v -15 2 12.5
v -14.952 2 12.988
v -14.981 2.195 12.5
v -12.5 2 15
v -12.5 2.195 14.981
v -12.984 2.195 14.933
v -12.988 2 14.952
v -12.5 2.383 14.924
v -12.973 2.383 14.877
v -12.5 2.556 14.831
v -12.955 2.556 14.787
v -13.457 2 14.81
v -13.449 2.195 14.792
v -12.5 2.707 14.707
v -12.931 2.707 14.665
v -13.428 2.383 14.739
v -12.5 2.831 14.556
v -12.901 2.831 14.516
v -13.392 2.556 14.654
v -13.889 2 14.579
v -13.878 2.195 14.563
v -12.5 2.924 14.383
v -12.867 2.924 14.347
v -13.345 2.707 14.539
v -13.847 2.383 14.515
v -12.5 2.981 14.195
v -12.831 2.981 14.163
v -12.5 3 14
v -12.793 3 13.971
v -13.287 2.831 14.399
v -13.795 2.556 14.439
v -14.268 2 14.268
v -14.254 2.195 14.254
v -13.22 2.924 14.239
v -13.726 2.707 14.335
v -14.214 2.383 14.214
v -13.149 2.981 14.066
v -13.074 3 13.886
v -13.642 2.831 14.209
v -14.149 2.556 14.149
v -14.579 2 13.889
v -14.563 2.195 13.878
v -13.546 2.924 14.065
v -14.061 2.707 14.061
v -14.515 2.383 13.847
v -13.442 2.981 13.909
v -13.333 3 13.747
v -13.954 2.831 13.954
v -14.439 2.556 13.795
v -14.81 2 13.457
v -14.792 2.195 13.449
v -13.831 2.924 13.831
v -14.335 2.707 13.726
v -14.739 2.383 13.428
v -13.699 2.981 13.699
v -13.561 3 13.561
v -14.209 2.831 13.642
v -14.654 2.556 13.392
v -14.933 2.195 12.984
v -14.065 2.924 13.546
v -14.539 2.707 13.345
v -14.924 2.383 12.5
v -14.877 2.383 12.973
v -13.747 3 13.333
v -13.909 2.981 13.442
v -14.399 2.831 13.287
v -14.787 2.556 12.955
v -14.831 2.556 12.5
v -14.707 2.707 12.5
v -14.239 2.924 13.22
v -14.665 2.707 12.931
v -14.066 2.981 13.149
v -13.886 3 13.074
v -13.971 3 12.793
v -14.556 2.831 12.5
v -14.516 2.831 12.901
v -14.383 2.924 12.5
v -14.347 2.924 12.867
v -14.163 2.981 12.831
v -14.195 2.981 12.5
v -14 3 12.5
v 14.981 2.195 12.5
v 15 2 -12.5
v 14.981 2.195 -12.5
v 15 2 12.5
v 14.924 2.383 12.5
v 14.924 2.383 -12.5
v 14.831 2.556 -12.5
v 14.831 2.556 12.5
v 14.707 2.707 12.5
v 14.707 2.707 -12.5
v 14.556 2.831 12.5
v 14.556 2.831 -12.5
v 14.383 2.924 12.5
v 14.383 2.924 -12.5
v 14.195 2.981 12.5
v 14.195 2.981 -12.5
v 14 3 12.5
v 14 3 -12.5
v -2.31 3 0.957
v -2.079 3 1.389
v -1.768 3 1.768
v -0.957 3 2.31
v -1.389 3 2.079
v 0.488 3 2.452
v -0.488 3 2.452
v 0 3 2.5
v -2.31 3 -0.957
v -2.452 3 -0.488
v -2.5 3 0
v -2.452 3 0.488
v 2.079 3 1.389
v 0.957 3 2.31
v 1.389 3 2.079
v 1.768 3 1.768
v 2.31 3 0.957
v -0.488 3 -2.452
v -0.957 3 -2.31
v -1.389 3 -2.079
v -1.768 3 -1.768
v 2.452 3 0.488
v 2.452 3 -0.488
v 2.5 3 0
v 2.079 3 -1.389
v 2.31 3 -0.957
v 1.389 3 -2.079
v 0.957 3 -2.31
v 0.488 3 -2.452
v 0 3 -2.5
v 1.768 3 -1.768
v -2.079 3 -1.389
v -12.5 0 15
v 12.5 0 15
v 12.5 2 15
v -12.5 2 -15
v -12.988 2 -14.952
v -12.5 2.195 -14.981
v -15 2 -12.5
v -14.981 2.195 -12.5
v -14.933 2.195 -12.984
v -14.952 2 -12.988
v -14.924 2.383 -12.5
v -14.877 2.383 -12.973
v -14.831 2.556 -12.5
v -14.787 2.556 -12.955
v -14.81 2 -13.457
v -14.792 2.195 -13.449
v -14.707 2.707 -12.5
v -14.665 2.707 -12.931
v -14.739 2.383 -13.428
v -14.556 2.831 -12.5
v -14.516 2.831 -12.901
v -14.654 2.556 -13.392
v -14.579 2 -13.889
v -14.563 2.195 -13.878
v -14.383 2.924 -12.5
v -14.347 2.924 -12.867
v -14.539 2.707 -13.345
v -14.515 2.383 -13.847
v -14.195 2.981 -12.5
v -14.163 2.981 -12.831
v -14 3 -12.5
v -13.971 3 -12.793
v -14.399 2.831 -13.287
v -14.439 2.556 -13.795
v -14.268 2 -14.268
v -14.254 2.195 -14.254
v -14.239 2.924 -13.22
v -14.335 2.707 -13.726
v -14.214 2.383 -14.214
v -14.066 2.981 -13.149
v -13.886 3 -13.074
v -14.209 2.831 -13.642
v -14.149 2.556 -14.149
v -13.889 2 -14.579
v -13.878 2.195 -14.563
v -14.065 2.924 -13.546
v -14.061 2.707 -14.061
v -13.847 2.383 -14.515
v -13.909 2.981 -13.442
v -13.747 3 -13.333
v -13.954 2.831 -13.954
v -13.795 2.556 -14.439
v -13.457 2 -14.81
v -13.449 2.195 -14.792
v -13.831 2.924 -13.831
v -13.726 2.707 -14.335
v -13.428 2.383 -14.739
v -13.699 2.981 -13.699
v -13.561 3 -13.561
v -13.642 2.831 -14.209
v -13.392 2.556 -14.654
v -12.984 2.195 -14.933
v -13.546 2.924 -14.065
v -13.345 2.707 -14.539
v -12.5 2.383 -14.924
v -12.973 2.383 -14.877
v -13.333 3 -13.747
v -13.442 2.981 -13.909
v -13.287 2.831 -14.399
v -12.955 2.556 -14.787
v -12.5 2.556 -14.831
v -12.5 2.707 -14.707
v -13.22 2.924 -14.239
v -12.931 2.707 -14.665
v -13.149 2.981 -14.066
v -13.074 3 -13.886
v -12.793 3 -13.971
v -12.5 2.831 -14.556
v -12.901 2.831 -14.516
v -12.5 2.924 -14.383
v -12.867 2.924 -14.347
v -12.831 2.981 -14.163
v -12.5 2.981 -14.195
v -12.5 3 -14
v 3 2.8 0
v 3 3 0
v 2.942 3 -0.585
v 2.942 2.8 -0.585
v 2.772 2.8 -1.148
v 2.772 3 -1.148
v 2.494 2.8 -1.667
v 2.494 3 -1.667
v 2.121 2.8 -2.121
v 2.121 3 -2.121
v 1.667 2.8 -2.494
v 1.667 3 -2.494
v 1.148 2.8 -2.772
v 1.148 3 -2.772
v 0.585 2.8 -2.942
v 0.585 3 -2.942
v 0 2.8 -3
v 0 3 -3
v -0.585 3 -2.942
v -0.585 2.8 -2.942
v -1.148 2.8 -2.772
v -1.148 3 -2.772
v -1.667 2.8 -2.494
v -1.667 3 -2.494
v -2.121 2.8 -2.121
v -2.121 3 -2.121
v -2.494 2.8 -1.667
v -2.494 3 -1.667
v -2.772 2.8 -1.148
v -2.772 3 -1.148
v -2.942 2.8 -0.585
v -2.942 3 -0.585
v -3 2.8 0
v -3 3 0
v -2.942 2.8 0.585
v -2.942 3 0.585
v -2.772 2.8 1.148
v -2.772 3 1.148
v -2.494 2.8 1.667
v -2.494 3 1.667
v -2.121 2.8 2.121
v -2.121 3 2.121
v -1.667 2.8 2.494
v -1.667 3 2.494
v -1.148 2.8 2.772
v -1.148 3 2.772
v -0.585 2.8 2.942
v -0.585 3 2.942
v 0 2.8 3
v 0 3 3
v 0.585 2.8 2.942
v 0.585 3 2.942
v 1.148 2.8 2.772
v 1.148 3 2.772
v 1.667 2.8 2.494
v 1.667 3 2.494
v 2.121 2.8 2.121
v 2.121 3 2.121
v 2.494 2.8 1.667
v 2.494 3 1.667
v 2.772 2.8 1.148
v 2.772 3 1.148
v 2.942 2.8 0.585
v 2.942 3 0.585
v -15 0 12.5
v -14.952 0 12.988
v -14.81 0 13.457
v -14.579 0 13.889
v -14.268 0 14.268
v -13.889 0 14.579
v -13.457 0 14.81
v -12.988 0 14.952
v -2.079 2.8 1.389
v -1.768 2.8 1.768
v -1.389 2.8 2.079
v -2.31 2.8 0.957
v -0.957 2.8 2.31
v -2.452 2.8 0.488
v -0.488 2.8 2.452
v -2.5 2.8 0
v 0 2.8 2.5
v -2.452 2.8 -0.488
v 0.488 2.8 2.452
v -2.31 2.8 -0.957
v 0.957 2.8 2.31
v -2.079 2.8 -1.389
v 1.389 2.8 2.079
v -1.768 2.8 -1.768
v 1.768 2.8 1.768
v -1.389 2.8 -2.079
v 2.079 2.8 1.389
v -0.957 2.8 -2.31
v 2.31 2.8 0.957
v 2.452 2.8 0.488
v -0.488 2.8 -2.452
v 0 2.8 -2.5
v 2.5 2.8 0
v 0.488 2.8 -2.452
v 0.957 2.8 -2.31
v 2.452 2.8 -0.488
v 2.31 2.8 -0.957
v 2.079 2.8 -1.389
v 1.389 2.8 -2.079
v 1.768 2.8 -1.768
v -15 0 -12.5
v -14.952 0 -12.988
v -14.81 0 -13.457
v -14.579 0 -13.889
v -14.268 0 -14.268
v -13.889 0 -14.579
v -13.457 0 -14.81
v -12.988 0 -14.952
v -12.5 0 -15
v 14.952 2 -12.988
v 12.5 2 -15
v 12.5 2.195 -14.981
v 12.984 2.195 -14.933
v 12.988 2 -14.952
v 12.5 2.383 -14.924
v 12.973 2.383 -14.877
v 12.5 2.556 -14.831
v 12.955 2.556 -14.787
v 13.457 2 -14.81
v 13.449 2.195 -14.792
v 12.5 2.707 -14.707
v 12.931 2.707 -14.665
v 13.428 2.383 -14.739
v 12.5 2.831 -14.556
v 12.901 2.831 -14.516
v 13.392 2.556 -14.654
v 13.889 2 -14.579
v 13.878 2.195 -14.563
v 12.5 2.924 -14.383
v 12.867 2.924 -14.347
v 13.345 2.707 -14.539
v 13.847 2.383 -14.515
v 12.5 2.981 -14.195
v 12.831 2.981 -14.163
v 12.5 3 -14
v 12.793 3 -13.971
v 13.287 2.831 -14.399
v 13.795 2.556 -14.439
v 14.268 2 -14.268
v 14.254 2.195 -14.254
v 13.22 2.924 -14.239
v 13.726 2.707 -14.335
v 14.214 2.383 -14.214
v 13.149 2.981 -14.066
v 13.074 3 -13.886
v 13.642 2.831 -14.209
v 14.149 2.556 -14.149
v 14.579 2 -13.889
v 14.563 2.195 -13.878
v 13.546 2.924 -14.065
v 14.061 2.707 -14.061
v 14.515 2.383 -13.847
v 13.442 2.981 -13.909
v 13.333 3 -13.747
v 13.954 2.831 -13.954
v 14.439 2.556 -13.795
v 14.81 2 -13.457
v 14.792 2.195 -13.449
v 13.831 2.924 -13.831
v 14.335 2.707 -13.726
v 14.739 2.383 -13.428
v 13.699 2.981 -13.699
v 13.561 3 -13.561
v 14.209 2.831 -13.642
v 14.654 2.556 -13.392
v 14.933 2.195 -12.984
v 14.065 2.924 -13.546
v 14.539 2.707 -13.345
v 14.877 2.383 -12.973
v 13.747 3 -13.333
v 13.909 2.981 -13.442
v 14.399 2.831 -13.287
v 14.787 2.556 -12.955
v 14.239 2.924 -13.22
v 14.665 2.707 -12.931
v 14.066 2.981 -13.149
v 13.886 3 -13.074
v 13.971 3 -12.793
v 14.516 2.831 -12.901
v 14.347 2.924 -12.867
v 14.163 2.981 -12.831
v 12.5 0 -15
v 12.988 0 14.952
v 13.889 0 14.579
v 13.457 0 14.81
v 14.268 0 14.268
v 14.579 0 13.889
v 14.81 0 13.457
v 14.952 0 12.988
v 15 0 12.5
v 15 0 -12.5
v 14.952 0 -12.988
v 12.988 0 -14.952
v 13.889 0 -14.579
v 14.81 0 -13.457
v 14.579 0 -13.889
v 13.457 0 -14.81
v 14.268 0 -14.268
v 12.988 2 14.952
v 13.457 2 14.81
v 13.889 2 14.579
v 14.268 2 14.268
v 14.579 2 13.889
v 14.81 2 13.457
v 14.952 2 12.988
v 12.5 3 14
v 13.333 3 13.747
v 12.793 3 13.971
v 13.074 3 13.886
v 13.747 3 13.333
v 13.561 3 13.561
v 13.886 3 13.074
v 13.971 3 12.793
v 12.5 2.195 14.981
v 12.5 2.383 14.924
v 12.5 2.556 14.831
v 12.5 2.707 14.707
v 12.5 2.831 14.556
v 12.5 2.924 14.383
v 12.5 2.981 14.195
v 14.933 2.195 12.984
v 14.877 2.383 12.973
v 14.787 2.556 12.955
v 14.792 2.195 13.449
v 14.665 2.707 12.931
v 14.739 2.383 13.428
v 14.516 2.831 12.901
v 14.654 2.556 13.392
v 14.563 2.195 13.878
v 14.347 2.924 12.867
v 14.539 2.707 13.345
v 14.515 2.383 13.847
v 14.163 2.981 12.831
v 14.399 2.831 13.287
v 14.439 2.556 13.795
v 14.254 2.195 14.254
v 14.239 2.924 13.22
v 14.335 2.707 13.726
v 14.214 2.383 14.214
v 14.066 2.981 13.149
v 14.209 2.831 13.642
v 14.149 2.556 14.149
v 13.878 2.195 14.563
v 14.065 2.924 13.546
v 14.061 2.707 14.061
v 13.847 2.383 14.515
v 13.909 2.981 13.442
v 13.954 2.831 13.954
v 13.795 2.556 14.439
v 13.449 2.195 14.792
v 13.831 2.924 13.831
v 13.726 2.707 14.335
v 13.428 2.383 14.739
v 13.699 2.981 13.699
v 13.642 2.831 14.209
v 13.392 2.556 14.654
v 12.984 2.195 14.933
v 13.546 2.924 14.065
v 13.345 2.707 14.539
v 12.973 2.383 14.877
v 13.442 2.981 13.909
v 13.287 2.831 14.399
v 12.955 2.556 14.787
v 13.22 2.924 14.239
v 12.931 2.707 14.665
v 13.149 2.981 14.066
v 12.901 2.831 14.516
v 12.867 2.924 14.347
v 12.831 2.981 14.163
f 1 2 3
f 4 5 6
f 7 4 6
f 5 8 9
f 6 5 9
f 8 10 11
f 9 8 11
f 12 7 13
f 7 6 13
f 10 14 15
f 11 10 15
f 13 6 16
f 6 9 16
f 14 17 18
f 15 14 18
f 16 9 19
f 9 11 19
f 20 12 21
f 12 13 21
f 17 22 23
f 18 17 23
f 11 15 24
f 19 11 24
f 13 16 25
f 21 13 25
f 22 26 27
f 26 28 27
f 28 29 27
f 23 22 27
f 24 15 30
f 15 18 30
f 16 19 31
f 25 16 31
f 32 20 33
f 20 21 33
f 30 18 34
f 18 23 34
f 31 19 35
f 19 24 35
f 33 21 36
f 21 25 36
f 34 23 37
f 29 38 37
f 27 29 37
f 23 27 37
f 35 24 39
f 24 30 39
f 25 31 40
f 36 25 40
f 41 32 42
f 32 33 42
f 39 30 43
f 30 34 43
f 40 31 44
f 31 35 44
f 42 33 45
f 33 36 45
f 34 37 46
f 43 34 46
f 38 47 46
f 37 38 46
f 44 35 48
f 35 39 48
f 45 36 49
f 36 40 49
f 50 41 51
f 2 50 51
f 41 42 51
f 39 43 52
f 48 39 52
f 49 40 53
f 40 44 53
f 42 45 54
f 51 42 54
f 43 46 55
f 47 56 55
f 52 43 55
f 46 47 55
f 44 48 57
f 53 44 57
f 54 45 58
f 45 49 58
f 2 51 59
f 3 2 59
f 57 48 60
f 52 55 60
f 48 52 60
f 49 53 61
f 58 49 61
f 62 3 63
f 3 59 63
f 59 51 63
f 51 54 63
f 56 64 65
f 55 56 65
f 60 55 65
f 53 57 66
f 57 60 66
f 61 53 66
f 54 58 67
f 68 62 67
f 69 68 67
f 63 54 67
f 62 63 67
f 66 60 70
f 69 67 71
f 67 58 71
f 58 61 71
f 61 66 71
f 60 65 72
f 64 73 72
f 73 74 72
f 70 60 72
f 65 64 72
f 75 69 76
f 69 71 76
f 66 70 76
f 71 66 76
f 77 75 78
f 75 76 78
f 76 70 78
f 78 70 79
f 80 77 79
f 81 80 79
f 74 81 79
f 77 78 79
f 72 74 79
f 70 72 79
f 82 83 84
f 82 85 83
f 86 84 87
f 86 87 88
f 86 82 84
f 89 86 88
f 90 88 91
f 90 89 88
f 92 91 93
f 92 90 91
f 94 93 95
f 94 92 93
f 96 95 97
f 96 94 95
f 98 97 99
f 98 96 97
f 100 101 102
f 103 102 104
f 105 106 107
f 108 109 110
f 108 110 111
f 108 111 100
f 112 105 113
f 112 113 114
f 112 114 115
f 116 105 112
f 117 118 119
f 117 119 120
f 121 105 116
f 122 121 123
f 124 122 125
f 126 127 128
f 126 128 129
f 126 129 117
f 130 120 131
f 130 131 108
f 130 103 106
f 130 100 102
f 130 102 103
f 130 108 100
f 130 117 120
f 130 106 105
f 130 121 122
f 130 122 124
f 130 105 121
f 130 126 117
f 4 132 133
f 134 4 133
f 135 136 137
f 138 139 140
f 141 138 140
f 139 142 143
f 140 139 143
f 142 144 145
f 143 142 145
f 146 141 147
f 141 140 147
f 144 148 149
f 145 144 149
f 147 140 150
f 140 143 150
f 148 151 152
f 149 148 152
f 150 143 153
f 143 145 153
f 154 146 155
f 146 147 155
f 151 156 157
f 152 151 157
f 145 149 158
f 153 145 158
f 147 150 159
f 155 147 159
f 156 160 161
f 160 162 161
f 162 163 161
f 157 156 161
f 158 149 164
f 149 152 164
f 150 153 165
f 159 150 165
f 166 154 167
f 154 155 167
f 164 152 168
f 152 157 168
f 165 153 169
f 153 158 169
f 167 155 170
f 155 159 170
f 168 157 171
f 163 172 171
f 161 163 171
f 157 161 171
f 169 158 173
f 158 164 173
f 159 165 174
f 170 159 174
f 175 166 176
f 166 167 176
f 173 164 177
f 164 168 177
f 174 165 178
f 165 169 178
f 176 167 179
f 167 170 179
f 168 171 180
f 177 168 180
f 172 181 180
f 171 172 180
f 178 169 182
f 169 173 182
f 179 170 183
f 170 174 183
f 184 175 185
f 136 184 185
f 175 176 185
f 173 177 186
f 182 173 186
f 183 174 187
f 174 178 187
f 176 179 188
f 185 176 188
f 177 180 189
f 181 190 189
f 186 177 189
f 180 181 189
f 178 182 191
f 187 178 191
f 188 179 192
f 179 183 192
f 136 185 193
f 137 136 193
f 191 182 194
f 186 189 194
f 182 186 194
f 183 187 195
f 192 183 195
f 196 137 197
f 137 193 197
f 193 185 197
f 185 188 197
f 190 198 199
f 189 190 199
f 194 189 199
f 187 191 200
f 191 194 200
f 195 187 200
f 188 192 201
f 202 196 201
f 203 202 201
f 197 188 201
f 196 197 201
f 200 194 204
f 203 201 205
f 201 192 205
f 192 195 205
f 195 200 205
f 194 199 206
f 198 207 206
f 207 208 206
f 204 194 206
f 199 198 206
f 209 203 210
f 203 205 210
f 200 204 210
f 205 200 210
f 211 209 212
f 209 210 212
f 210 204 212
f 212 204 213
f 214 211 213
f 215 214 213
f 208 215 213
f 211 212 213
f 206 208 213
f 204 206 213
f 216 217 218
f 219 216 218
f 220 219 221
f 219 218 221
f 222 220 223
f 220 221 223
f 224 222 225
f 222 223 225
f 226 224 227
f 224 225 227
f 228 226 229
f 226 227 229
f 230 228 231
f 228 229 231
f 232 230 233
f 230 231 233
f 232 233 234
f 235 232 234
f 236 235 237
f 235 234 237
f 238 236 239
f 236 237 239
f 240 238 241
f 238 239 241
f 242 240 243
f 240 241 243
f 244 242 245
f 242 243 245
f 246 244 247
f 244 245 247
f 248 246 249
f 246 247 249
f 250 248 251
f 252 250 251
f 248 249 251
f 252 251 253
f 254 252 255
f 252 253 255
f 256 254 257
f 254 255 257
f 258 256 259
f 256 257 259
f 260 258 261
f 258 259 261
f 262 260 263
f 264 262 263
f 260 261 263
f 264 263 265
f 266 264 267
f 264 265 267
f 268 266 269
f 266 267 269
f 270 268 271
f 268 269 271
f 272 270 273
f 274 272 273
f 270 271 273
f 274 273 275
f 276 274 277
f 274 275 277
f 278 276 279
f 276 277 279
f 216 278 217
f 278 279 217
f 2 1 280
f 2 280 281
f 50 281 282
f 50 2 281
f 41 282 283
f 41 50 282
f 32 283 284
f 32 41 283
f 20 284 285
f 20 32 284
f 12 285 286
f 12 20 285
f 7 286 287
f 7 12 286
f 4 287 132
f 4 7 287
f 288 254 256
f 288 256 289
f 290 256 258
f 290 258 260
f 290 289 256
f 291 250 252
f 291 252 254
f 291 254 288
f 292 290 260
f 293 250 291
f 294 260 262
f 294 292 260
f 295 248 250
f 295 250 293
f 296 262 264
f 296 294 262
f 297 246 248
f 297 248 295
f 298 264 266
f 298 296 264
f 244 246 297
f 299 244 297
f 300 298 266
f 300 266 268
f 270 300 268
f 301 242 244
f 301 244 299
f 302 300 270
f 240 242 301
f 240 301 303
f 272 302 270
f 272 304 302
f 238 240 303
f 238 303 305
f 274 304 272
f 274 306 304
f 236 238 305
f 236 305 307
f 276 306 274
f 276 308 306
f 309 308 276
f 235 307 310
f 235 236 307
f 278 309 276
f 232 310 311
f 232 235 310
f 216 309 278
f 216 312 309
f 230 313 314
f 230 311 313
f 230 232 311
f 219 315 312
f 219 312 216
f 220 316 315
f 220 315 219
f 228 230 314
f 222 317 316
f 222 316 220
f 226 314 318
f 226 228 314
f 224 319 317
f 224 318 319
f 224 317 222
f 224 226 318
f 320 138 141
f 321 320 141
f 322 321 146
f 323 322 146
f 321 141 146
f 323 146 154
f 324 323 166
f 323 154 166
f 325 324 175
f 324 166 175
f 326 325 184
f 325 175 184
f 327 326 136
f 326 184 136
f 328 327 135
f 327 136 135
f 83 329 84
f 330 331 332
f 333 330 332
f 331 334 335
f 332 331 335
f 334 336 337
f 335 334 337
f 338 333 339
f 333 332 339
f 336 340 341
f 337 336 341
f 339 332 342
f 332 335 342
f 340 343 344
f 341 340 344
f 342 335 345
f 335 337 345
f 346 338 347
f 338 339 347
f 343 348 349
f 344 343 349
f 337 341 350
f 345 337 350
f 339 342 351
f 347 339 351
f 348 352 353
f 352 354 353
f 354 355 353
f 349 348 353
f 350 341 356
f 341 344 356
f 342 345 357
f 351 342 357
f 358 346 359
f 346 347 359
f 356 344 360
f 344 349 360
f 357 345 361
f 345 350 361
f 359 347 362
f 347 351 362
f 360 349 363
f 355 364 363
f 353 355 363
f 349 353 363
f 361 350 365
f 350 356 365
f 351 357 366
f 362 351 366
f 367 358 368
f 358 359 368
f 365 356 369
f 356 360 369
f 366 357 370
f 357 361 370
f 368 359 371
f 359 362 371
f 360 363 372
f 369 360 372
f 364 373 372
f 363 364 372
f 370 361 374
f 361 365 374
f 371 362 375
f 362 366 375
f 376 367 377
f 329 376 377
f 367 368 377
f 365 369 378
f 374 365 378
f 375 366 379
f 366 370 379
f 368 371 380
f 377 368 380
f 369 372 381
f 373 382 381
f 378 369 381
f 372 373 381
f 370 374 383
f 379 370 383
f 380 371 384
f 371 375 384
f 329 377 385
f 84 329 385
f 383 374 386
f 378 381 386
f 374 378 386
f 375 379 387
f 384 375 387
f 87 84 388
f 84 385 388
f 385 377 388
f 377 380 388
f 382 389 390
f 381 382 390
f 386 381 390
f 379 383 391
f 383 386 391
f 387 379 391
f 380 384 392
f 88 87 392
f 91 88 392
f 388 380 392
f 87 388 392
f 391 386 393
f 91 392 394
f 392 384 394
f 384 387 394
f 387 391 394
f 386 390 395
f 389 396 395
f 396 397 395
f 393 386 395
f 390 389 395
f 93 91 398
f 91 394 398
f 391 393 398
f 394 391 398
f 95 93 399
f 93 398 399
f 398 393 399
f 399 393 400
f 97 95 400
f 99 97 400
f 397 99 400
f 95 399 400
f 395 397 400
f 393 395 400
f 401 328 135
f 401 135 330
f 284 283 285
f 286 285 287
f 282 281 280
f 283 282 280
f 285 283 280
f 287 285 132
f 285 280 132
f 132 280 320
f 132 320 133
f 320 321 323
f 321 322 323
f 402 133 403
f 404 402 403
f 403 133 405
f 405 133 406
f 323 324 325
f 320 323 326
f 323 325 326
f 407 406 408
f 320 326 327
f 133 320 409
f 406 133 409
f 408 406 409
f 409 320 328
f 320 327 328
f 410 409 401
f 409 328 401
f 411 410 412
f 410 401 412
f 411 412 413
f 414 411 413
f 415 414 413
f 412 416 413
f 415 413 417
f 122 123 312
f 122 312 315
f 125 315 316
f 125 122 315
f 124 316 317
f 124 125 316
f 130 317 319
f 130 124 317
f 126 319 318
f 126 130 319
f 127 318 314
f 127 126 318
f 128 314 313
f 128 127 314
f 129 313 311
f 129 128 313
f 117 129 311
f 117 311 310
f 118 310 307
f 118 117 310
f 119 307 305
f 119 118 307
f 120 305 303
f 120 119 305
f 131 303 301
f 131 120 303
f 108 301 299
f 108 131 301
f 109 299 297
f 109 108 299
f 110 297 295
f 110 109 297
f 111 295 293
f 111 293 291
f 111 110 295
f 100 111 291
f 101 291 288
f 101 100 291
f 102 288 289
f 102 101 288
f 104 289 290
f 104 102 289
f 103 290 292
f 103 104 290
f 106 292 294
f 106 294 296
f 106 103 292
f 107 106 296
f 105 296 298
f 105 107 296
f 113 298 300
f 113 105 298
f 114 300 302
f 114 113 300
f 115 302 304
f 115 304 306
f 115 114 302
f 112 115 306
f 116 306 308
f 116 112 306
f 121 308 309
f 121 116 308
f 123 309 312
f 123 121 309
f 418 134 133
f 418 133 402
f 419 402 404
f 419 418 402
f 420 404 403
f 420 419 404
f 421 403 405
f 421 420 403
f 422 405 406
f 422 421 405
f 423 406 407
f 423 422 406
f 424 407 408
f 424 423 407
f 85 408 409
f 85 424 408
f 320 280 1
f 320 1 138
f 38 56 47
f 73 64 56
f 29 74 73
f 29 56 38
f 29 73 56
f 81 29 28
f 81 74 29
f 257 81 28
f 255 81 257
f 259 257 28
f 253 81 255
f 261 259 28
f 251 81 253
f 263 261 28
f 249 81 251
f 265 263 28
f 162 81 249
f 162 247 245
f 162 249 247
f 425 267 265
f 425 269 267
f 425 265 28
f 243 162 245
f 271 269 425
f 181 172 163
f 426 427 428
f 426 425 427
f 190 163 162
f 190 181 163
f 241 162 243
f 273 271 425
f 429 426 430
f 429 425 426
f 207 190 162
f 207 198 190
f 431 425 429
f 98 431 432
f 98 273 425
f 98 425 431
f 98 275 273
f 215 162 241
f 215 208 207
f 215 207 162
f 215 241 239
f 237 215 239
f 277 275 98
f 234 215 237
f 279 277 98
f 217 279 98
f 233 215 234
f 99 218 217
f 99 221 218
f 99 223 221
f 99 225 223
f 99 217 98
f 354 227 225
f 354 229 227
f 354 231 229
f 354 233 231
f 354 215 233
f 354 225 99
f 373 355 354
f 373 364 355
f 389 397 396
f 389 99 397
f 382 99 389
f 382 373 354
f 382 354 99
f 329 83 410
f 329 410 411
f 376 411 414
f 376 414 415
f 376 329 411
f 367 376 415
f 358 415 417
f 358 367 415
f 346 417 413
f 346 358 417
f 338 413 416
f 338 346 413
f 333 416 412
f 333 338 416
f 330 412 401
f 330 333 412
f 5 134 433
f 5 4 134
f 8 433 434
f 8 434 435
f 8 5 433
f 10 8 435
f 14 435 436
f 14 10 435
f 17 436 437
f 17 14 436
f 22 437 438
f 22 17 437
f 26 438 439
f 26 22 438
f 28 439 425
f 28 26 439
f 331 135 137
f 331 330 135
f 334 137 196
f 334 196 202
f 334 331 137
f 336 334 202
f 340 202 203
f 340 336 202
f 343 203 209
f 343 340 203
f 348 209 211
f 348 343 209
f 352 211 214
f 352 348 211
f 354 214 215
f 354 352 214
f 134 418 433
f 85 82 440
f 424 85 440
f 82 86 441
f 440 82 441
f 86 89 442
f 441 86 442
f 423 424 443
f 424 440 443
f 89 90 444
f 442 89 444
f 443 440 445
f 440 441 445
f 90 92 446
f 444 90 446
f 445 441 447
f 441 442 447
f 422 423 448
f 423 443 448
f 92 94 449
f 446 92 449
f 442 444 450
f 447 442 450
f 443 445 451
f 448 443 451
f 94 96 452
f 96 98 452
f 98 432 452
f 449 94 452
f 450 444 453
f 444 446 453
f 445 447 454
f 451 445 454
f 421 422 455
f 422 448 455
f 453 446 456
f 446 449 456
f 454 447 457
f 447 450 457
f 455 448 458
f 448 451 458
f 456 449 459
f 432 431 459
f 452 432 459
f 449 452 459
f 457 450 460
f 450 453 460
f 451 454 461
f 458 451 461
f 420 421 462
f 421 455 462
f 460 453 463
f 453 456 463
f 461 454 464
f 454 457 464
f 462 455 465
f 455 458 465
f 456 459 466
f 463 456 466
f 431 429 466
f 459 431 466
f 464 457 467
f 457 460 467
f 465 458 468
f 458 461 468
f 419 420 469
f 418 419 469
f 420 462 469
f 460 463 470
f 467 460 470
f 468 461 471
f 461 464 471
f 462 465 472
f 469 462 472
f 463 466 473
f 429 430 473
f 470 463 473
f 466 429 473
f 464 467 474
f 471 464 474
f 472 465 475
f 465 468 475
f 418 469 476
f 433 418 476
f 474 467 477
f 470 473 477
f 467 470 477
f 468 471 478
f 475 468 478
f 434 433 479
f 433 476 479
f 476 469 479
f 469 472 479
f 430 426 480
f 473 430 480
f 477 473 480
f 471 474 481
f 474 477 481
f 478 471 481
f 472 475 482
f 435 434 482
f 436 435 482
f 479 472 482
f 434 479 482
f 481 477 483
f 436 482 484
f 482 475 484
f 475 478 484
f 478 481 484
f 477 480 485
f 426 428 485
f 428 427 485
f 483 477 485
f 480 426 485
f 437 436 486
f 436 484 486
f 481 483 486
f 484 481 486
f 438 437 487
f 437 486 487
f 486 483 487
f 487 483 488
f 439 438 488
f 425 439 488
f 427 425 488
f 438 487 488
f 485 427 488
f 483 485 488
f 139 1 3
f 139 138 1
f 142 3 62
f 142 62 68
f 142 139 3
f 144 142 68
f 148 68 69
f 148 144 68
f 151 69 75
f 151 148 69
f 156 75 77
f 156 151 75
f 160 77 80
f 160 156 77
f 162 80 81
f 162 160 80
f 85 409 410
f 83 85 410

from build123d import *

# Parameters (mm, degrees)
SKETCH1_W           = 30
SKETCH1_H           = 30
BOSS_EXTRUDE1_DEPTH = 3
FILLET1_R           = 2.5
FILLET2_R           = 1
SKETCH2_R           = 3
SKETCH2_R_2         = 2.5
CUT_EXTRUDE1_DEPTH  = 0.2


with BuildPart() as part:
    # Sketch1 → Boss-Extrude1 (new body)
    with BuildSketch(Plane(origin=(0, 0, 0), x_dir=(1, 0, 0), z_dir=(0, 1, 0))):
        Rectangle(SKETCH1_W, SKETCH1_H)
    extrude(amount=BOSS_EXTRUDE1_DEPTH)

    # Fillet1
    fillet1_edges = [part.edges().sort_by_distance(p)[0] for p in [
        (15, 1.5, 15),
        (-15, 1.5, 15),
        (-15, 1.5, -15),
        (15, 1.5, -15),
    ]]
    fillet(fillet1_edges, radius=FILLET1_R)

    # Fillet2
    fillet2_edges = [part.edges().sort_by_distance(p)[0] for p in [
        (-15, 3, 0),
        (0, 3, -15),
        (15, 3, 0),
        (0, 3, 15),
        (14.267766953, 3, 14.267766953),
        (-14.267766953, 3, 14.267766953),
        (14.267766953, 3, -14.267766953),
        (-14.267766953, 3, -14.267766953),
    ]]
    fillet(fillet2_edges, radius=FILLET2_R)

    # Sketch2 → Cut-Extrude1 (cut)
    with BuildSketch(Plane(origin=(0, 3, 0), x_dir=(1, 0, 0), z_dir=(0, 1, 0))):
        Circle(SKETCH2_R)
        Circle(SKETCH2_R_2, mode=Mode.SUBTRACT)
    extrude(amount=-CUT_EXTRUDE1_DEPTH, mode=Mode.SUBTRACT)


solid = part.part
